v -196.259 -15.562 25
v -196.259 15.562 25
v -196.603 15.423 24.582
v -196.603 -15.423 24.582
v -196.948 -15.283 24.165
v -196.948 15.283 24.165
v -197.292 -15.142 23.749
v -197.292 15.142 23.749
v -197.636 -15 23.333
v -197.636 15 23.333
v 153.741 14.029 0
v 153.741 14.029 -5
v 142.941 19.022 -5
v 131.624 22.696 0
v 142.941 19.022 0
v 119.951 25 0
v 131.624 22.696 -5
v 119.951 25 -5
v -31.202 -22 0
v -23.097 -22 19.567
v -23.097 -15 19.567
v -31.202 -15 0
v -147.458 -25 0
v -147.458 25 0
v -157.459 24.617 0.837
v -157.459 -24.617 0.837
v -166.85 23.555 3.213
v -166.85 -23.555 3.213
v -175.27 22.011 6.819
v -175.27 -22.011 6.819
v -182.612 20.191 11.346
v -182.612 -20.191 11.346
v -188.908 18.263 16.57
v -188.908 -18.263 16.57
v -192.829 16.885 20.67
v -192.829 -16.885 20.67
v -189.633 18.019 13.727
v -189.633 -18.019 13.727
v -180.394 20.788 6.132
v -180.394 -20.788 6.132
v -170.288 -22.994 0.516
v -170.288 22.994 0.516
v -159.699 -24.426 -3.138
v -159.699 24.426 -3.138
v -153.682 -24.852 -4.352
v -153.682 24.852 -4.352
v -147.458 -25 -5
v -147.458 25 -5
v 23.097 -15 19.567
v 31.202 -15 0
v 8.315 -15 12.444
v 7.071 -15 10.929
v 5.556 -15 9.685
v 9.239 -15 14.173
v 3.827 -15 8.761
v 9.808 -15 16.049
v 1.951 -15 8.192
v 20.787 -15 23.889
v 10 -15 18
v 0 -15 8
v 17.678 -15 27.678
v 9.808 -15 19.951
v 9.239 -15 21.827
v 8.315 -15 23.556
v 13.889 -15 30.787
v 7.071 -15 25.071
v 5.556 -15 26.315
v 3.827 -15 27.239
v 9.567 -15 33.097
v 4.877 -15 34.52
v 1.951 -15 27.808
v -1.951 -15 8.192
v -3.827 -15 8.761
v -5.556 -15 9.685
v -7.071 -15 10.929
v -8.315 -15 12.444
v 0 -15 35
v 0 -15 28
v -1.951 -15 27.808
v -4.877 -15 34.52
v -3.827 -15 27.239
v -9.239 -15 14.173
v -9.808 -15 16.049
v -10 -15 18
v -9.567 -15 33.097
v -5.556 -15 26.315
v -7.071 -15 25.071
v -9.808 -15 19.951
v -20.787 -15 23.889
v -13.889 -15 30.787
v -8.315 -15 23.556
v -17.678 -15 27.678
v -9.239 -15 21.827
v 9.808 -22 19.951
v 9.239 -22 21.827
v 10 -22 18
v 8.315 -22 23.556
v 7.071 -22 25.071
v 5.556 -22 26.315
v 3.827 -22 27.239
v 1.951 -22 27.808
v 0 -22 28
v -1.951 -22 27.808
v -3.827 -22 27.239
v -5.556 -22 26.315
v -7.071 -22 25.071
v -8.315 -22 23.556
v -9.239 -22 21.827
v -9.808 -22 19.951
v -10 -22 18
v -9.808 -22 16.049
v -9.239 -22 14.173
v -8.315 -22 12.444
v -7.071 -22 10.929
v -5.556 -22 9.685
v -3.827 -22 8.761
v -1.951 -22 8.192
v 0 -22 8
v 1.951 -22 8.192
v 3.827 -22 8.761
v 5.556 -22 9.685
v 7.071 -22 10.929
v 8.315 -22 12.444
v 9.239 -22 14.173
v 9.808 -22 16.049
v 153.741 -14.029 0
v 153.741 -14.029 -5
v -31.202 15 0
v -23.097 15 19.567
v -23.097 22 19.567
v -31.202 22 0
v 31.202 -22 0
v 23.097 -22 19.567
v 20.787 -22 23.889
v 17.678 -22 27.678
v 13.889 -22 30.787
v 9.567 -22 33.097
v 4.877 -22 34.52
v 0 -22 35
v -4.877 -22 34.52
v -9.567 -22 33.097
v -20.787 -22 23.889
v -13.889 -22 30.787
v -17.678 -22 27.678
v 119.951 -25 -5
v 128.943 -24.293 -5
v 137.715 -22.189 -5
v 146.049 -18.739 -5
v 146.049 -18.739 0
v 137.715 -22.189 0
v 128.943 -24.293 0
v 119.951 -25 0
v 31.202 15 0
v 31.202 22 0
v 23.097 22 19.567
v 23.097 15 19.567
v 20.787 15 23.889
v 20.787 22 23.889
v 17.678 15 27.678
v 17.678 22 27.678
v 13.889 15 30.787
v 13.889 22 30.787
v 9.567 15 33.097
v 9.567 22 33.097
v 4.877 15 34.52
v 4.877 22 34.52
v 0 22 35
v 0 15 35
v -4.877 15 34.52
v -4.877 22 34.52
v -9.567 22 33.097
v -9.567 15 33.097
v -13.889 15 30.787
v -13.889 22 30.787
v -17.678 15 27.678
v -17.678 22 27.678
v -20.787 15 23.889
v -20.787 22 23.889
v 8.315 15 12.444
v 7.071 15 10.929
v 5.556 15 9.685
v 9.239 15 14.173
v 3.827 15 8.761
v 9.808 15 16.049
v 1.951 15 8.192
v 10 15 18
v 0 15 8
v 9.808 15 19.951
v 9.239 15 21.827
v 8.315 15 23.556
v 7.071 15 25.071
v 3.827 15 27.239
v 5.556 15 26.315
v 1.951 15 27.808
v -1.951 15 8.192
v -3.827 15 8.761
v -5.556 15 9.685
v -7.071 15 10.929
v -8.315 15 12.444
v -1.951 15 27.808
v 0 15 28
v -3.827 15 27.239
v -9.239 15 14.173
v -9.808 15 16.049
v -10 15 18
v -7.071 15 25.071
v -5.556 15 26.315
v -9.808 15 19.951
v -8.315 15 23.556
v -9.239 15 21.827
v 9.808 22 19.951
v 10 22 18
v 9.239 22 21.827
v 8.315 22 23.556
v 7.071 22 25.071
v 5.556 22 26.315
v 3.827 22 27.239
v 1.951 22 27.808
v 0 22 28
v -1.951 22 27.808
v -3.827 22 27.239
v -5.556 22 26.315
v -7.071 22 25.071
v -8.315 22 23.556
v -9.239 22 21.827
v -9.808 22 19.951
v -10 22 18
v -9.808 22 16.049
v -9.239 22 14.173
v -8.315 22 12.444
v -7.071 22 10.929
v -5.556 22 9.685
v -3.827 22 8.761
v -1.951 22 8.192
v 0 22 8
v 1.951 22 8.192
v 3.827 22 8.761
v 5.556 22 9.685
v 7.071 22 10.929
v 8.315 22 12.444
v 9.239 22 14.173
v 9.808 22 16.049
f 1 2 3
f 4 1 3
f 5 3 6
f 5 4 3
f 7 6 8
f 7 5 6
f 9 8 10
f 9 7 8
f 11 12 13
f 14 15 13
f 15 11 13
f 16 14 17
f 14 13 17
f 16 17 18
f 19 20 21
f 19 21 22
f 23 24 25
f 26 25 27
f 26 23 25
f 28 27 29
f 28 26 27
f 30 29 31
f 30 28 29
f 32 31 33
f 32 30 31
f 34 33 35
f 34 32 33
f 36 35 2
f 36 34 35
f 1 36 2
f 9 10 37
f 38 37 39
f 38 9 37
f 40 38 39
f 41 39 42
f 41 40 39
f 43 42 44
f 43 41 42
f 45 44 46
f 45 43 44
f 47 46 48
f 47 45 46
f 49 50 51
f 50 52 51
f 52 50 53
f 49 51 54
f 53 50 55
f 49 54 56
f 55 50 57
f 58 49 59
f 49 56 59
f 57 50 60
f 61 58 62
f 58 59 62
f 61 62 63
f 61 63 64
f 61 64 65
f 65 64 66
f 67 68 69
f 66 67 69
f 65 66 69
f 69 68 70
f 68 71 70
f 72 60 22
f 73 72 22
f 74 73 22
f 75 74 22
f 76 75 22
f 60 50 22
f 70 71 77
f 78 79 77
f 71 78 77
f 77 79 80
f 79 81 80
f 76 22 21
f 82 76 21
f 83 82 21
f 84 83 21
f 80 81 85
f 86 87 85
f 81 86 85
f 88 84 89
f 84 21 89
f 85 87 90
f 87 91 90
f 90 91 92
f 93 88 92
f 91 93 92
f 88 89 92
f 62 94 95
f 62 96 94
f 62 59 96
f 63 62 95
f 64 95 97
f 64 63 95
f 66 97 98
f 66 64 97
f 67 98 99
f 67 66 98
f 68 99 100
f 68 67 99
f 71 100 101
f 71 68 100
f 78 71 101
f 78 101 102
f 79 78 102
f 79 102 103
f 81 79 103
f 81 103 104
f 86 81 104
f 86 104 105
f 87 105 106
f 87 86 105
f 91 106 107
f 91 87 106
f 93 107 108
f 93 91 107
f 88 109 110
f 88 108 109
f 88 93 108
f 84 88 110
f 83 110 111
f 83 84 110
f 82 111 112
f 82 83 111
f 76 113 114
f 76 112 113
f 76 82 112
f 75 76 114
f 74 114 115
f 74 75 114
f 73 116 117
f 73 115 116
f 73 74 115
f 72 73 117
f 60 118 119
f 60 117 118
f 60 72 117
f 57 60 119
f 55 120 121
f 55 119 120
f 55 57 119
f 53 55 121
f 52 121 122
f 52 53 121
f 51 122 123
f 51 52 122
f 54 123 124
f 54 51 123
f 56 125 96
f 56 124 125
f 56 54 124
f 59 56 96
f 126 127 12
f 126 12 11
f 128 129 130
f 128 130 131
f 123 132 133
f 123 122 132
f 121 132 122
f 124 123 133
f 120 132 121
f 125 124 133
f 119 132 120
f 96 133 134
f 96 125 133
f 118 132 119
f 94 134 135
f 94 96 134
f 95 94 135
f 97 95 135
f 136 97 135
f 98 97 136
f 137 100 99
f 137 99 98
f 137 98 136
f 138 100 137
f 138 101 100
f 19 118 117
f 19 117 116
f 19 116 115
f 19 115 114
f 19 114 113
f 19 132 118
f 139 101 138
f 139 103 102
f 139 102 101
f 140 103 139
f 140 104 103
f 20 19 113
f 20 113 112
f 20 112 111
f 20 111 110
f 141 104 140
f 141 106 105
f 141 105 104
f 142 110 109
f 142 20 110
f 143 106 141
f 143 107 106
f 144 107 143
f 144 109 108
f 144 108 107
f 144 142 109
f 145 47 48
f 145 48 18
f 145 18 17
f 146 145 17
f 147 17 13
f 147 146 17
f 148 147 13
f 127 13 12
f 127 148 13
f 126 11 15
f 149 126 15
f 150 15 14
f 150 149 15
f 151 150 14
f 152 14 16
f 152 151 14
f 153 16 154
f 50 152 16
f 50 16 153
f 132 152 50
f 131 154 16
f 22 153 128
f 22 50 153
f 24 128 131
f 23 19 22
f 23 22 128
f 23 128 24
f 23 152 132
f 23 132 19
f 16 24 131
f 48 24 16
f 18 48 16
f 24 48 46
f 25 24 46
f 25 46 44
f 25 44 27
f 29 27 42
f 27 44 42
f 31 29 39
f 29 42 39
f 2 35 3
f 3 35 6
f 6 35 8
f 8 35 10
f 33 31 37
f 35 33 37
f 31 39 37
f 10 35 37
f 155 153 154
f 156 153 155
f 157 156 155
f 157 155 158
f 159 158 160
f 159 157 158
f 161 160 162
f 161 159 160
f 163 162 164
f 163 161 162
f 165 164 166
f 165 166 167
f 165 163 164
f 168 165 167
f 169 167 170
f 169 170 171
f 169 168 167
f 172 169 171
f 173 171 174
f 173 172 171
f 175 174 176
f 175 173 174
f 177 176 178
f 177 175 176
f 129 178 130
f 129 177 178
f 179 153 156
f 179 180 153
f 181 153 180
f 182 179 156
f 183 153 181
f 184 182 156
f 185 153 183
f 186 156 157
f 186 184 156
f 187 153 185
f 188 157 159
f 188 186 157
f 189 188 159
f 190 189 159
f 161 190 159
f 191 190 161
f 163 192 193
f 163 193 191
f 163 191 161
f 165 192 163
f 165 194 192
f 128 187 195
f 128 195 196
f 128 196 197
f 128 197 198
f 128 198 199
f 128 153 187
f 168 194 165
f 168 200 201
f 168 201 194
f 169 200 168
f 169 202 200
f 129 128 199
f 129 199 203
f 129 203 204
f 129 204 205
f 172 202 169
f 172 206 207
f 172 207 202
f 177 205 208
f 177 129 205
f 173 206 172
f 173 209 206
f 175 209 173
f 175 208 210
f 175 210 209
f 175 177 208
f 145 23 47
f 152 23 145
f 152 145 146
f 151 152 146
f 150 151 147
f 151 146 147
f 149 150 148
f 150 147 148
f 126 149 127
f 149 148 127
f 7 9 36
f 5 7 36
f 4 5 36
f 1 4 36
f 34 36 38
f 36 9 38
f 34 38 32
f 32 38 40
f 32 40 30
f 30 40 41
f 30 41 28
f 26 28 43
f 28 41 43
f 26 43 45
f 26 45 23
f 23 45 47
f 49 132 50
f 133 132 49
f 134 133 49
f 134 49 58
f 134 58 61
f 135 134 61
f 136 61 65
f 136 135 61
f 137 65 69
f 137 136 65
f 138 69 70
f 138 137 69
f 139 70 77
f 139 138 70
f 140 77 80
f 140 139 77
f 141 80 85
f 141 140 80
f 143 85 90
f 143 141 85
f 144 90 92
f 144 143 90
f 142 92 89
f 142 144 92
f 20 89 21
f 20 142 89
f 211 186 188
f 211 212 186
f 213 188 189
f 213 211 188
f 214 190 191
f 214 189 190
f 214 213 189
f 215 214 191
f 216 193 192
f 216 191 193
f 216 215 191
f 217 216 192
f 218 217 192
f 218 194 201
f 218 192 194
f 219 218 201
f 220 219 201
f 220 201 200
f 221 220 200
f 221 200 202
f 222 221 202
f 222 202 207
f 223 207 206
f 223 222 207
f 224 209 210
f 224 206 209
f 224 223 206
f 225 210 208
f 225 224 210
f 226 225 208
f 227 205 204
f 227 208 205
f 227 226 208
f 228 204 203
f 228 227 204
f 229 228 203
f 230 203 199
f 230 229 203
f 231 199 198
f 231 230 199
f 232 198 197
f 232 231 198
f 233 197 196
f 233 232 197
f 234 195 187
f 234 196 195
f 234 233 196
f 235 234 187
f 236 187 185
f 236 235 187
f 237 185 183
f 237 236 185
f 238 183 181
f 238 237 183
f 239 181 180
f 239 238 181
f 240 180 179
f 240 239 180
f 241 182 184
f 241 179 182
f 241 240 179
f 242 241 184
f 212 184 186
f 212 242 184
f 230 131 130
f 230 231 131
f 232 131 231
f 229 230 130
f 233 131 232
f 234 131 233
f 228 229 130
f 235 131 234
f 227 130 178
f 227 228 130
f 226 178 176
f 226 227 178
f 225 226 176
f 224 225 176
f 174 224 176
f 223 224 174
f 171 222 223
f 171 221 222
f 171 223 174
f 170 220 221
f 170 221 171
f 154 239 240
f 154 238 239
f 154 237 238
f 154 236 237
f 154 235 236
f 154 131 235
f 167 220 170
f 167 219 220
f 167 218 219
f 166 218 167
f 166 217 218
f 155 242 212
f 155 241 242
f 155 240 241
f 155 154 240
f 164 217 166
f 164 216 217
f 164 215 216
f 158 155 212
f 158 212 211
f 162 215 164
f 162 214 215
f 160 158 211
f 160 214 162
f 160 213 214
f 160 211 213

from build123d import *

# Parameters (mm, degrees)
F0_R     = 10
F1_DEPTH = 25
F2_W     = 30
F2_H     = 40.766016
F2_W_2   = 3
F3_DEPTH = 40
F5_DEPTH = 40.001


with BuildPart() as f1:
    # F0 (on Front) → F1 (new body, symmetric)
    with BuildSketch(Plane.XZ):
        with BuildLine():
            Line((-31.201941, 0), (-147.458184, 0))
            ThreePointArc((-147.458184, 0), (-174.873856, 6.613726), (-196.258555, 25))
            Line((-196.258555, 25), (-197.63568, 23.332754))
            ThreePointArc((-197.63568, 23.332754), (-175.850829, 3.315154), (-147.458184, -5))
            Line((-147.458184, -5), (153.741445, -5))
            Line((153.741445, -5), (153.741445, 0))
            Line((153.741445, 0), (31.201941, 0))
            Line((31.201941, 0), (-31.201941, 0))
        make_face()
        with BuildLine():
            Line((-23.096988, 19.567086), (-31.201941, 0))
            Line((-31.201941, 0), (31.201941, 0))
            Line((31.201941, 0), (23.096988, 19.567086))
            ThreePointArc((23.096988, 19.567086), (0, 35), (-23.096988, 19.567086))
        make_face()
        with Locations((0, 18)):
            Circle(F0_R, mode=Mode.SUBTRACT)
    extrude(amount=F1_DEPTH, both=True)

    # F2 (on Right) → F3 (cut, symmetric)
    with BuildSketch(Plane.YZ):
        with Locations((0, 20.383008)):
            Rectangle(F2_W, F2_H)
        with Locations((-23.5, 20.383008)):
            Rectangle(F2_W_2, F2_H)
        with Locations((23.5, 20.383008)):
            Rectangle(F2_W_2, F2_H)
    extrude(amount=F3_DEPTH, both=True, mode=Mode.SUBTRACT)

    # F4 (on face) → F5 (cut, through all)
    with BuildSketch(Plane(origin=(0, 0, -5), x_dir=(1, 0, 0), z_dir=(0, 0, -1))):
        with BuildLine():
            ThreePointArc((-197.63568, 15), (-173.040312, 22.475658), (-147.458184, 25))
            Line((-147.458184, 25), (-197.63568, 25))
            Line((-197.63568, 25), (-197.63568, 15))
        make_face()
        with BuildLine():
            ThreePointArc((-147.458184, -25), (-173.040312, -22.475658), (-197.63568, -15))
            Line((-197.63568, -15), (-197.63568, -25))
            Line((-197.63568, -25), (-147.458184, -25))
        make_face()
        with BuildLine():
            ThreePointArc((153.741445, -14.029152), (137.337425, -21.027169), (119.951203, -25))
            Line((119.951203, -25), (153.741445, -25))
            Line((153.741445, -25), (153.741445, -14.029152))
        make_face()
        with BuildLine():
            Line((153.741445, 14.029152), (153.741445, 25))
            Line((153.741445, 25), (119.951203, 25))
            ThreePointArc((119.951203, 25), (137.714508, 22.188584), (153.741445, 14.029152))
        make_face()
    extrude(amount=-F5_DEPTH, mode=Mode.SUBTRACT)


solid = f1.part
